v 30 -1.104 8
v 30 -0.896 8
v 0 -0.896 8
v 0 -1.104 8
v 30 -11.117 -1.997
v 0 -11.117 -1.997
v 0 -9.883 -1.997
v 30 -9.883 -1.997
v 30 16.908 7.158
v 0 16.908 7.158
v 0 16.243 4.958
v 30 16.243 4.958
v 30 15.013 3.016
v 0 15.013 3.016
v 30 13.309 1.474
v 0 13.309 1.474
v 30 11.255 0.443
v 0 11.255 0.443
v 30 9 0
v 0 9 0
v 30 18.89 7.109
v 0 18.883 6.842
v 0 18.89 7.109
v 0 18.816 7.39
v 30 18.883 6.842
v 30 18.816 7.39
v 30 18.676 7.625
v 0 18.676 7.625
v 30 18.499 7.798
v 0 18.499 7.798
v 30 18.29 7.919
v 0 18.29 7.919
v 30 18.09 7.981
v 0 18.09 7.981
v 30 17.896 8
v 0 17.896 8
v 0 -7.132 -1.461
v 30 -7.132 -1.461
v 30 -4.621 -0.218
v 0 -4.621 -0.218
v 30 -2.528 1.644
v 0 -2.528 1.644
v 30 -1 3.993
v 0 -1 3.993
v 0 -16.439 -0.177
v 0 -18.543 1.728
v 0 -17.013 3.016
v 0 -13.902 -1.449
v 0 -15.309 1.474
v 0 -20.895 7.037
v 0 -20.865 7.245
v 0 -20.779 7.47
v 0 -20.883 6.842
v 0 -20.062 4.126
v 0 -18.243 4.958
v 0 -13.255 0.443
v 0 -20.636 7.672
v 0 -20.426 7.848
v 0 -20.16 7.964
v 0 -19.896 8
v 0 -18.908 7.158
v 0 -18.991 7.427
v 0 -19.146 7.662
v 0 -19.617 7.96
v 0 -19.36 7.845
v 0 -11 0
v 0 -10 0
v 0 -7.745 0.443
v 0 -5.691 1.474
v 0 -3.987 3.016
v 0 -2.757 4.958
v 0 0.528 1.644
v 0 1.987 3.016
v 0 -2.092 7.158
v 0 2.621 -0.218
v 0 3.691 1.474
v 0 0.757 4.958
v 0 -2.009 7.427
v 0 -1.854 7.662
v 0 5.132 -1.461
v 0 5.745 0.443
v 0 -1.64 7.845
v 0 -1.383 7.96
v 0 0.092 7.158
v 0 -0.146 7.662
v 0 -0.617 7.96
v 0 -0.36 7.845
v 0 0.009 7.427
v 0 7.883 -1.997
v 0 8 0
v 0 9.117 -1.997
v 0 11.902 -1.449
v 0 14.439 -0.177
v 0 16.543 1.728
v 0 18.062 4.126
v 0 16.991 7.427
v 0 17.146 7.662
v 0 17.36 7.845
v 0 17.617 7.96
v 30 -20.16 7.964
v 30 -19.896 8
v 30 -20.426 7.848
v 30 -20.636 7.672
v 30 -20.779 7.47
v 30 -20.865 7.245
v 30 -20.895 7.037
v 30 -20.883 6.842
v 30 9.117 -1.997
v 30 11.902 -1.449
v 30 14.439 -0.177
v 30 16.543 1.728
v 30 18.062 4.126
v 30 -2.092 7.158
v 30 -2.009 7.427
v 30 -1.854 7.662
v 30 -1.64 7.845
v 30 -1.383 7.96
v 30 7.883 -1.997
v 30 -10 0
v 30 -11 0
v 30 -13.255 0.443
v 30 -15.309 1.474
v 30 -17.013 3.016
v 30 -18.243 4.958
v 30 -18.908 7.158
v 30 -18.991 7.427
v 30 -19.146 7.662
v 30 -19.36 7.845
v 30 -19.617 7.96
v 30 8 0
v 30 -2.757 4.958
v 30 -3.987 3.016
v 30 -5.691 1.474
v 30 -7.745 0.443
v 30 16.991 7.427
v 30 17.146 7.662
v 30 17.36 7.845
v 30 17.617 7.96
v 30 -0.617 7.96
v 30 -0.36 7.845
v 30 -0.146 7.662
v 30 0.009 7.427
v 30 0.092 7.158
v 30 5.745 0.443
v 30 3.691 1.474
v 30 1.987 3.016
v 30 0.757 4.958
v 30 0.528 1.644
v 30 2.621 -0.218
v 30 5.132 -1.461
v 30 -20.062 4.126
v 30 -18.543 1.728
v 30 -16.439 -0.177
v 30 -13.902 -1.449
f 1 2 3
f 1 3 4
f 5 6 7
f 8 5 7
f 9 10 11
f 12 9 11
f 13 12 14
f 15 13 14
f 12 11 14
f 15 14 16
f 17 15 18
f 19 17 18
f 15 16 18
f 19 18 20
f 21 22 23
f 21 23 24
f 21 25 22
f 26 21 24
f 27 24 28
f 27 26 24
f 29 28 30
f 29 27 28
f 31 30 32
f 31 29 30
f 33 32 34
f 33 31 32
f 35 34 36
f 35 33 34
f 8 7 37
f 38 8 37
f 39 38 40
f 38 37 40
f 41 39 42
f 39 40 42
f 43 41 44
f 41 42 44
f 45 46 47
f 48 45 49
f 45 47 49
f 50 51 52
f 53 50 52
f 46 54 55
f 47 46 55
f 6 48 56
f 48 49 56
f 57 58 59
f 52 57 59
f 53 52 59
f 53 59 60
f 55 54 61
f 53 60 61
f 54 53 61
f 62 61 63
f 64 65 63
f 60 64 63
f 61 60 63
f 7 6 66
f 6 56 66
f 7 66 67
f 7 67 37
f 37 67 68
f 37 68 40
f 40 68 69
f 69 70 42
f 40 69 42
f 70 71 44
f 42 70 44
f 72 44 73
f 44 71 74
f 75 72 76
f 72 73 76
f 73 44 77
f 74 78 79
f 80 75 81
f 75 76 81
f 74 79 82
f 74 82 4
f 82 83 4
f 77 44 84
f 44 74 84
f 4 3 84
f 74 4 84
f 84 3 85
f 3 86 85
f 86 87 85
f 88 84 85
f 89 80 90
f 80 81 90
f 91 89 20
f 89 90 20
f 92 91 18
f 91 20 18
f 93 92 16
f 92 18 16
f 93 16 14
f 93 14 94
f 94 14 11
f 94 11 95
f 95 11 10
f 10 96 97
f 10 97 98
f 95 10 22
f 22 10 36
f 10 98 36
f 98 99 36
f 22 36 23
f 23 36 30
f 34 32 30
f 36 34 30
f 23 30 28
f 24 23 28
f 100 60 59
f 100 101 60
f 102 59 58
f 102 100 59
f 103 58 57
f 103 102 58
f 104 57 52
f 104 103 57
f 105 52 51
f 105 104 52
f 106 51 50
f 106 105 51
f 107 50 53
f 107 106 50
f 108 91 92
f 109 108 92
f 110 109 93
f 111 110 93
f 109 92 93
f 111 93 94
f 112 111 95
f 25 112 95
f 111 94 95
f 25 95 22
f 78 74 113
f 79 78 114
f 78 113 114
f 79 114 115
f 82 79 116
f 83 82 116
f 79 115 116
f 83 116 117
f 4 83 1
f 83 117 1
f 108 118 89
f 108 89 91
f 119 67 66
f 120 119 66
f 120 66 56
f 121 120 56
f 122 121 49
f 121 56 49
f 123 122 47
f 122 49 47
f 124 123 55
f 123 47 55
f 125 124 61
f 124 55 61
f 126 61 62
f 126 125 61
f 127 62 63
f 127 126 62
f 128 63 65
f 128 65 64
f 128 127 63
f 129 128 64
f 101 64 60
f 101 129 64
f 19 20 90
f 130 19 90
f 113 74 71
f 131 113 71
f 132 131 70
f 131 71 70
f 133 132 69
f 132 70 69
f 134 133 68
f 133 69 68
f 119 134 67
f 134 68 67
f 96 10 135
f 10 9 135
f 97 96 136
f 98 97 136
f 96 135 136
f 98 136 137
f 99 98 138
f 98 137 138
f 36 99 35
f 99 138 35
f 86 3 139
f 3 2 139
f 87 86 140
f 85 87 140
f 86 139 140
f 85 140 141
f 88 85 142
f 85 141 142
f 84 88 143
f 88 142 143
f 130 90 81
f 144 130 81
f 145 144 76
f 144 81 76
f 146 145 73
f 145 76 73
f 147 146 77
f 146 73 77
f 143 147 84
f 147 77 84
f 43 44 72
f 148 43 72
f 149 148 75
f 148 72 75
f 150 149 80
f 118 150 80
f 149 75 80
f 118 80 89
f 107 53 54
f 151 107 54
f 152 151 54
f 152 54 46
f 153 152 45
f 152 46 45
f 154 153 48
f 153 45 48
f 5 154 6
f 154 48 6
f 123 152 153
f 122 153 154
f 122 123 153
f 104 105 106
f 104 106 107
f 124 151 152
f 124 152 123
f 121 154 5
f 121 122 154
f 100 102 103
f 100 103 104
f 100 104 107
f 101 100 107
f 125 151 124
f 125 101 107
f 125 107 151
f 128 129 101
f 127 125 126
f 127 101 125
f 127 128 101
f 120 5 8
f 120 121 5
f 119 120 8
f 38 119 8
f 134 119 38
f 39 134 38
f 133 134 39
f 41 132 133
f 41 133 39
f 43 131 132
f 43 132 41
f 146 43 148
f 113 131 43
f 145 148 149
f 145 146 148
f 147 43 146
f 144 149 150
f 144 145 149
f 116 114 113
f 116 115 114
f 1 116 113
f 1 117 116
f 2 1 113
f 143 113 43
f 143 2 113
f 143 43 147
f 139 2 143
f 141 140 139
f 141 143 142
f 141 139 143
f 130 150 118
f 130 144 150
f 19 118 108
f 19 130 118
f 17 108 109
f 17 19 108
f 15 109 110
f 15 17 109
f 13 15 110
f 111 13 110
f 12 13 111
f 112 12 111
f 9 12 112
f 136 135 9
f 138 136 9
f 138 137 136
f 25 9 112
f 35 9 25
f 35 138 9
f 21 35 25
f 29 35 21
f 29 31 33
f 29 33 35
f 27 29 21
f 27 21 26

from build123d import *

# Parameters (mm, degrees)
F1_DEPTH = 30
F2_R     = 1
F3_R     = 0.9999
F4_R     = 0.99999


# Not quite as in the source:
# - a fillet or chamfer is up to 0.001 mm smaller than in the source, because OpenCascade refuses the exact size


with BuildPart() as f1:
    # F0 (on Right) → F1 (new body)
    with BuildSketch(Plane.YZ):
        with BuildLine():
            Line((0, 8), (-1, 8))
            Line((-1, 8), (-2, 8))
            ThreePointArc((-2, 8), (-4.4792027106, 2.4792027106), (-10, 0))
            Line((-10, 0), (-11, 0))
            ThreePointArc((-11, 0), (-16.5207972894, 2.4792027106), (-19, 8))
            Line((-19, 8), (-20.9965492395, 8))
            Line((-20.9965492395, 8), (-20.9965492395, 7.8825559271))
            ThreePointArc((-20.9965492395, 7.8825559271), (-17.9350112011, 1.0649887989), (-11.1174440729, -1.9965492395))
            Line((-11.1174440729, -1.9965492395), (-9.8825559561, -1.9965487463))
            ThreePointArc((-9.8825559561, -1.9965487463), (-4.6211597315, -0.2176837422), (-1, 3.9934744279))
            ThreePointArc((-1, 3.9934744279), (2.6211597315, -0.2176837422), (7.8825559561, -1.9965487463))
            Line((7.8825559561, -1.9965487463), (9.1174440439, -1.9965487463))
            ThreePointArc((9.1174440439, -1.9965487463), (15.9350108518, 1.0649891482), (18.9965487463, 7.8825559561))
            Line((18.9965487463, 7.8825559561), (18.9965487463, 8))
            Line((18.9965487463, 8), (17, 8))
            ThreePointArc((17, 8), (14.5207972894, 2.4792027106), (9, 0))
            Line((9, 0), (8, 0))
            ThreePointArc((8, 0), (2.4792027106, 2.4792027106), (0, 8))
        make_face()
    extrude(amount=F1_DEPTH)

    # F2
    f2_edges = [f1.edges().sort_by_distance(p)[0] for p in [
        (15, -19, 8),
    ]]
    fillet(f2_edges, radius=F2_R)

    # F3 (radius 1 in the source; OpenCascade refuses exactly that, so slightly less here)
    f3_edges = [f1.edges().sort_by_distance(p)[0] for p in [
        (15, -20.996549, 8),
    ]]
    fillet(f3_edges, radius=F3_R)

    # F4 (radius 1 in the source; OpenCascade refuses exactly that, so slightly less here)
    f4_edges = [f1.edges().sort_by_distance(p)[0] for p in [
        (15, -2, 8),
        (15, 0, 8),
        (15, 18.996549, 8),
        (15, 17, 8),
    ]]
    fillet(f4_edges, radius=F4_R)


solid = f1.part
